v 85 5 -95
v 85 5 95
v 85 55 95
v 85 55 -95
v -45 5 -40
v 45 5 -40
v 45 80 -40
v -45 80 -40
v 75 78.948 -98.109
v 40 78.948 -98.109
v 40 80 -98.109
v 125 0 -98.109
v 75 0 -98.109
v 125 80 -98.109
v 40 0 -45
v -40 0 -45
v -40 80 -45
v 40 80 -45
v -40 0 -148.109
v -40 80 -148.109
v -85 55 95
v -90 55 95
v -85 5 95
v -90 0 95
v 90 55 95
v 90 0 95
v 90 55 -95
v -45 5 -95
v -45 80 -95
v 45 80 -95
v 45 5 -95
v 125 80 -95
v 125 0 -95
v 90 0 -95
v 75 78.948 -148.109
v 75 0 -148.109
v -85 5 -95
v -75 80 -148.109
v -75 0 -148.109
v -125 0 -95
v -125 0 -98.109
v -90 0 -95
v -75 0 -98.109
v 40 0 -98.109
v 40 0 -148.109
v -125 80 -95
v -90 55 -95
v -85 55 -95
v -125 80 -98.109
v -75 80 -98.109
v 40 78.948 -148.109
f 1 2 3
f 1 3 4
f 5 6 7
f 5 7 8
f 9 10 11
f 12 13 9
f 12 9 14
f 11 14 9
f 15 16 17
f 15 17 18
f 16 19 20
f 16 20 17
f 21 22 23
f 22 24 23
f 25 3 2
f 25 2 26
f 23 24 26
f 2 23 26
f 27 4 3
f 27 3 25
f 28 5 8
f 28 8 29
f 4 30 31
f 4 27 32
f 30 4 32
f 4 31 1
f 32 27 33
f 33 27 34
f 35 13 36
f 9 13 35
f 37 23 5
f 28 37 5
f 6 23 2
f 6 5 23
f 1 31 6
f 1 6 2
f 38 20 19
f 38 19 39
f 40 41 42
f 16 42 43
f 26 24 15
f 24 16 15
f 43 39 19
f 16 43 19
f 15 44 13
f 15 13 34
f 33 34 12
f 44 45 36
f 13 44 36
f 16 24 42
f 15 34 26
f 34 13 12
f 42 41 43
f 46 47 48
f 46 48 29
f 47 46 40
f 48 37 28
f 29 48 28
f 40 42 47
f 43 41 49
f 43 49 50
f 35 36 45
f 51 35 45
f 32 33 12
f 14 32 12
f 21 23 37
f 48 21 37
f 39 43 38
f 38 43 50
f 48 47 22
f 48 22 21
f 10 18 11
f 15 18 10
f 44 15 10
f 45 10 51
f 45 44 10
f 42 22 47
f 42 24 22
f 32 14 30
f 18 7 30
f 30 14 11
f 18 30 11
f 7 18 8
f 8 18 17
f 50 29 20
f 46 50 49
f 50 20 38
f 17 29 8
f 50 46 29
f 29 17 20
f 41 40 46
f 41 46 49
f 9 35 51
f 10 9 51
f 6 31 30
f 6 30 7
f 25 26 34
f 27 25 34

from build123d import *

# Parameters (mm, degrees)
SKETCH2_W           = 180
SKETCH2_H           = 190
BOSS_EXTRUDE3_DEPTH = 5
SKETCH4_W           = 5
SKETCH4_H           = 190
BOSS_EXTRUDE4_DEPTH = 50
SKETCH6_W           = 250
SKETCH6_H           = 3.1090482
BOSS_EXTRUDE6_DEPTH = 80
SKETCH7_W           = 35
SKETCH7_H           = 78.948410215
SKETCH7_H_2         = 80
BOSS_EXTRUDE7_DEPTH = 50
SKETCH8_W           = 80
SKETCH8_H           = 3.1090482
CUT_EXTRUDE1_DEPTH  = 123
SKETCH9_W           = 80
SKETCH9_H           = 50
CUT_EXTRUDE2_DEPTH  = 123
BOSS_EXTRUDE8_DEPTH = 75


with BuildPart() as part:
    # Sketch2 → Boss-Extrude3 (new body)
    with BuildSketch(Plane(origin=(0, 0, 0), x_dir=(1, 0, 0), z_dir=(0, 1, 0))):
        Rectangle(SKETCH2_W, SKETCH2_H)
    extrude(amount=BOSS_EXTRUDE3_DEPTH)

    # Sketch4 → Boss-Extrude4 (add)
    with BuildSketch(Plane(origin=(0, 5, 0), x_dir=(1, 0, 0), z_dir=(0, 1, 0))):
        with Locations((-87.5, 0)):
            Rectangle(SKETCH4_W, SKETCH4_H)
        with Locations((87.5, 0)):
            Rectangle(SKETCH4_W, SKETCH4_H)
    extrude(amount=BOSS_EXTRUDE4_DEPTH)

    # Sketch6 → Boss-Extrude6 (add)
    with BuildSketch(Plane(origin=(0, 0, 0), x_dir=(1, 0, 0), z_dir=(0, 1, 0))):
        with Locations((0, 96.5545241)):
            Rectangle(SKETCH6_W, SKETCH6_H)
    extrude(amount=BOSS_EXTRUDE6_DEPTH)

    # Sketch7 → Boss-Extrude7 (add)
    with BuildSketch(Plane(origin=(0, 0, -98.1090482), x_dir=(-1, 0, 0), z_dir=(0, 0, -1))):
        with Locations((-57.5, 39.474205108)):
            Rectangle(SKETCH7_W, SKETCH7_H)
        with Locations((57.5, 40)):
            Rectangle(SKETCH7_W, SKETCH7_H_2)
    extrude(amount=BOSS_EXTRUDE7_DEPTH)

    # Sketch8 → Cut-Extrude1 (cut)
    with BuildSketch(Plane(origin=(0, 80, 0), x_dir=(1, 0, 0), z_dir=(0, 1, 0))):
        with Locations((0, 96.5545241)):
            Rectangle(SKETCH8_W, SKETCH8_H)
    extrude(amount=-CUT_EXTRUDE1_DEPTH, mode=Mode.SUBTRACT)

    # Sketch9 → Cut-Extrude2 (cut)
    with BuildSketch(Plane(origin=(0, 5, 0), x_dir=(1, 0, 0), z_dir=(0, 1, 0))):
        with Locations((0, 70)):
            Rectangle(SKETCH9_W, SKETCH9_H)
    extrude(amount=-CUT_EXTRUDE2_DEPTH, mode=Mode.SUBTRACT)

    # Sketch10 → Boss-Extrude8 (add)
    with BuildSketch(Plane(origin=(0, 5, 0), x_dir=(1, 0, 0), z_dir=(0, 1, 0))):
        Polygon((-40, 95), (-40, 45), (40, 45), (40, 95), (45, 95), (45, 40), (-45, 40), (-45, 95), align=None)
    extrude(amount=BOSS_EXTRUDE8_DEPTH)


solid = part.part
